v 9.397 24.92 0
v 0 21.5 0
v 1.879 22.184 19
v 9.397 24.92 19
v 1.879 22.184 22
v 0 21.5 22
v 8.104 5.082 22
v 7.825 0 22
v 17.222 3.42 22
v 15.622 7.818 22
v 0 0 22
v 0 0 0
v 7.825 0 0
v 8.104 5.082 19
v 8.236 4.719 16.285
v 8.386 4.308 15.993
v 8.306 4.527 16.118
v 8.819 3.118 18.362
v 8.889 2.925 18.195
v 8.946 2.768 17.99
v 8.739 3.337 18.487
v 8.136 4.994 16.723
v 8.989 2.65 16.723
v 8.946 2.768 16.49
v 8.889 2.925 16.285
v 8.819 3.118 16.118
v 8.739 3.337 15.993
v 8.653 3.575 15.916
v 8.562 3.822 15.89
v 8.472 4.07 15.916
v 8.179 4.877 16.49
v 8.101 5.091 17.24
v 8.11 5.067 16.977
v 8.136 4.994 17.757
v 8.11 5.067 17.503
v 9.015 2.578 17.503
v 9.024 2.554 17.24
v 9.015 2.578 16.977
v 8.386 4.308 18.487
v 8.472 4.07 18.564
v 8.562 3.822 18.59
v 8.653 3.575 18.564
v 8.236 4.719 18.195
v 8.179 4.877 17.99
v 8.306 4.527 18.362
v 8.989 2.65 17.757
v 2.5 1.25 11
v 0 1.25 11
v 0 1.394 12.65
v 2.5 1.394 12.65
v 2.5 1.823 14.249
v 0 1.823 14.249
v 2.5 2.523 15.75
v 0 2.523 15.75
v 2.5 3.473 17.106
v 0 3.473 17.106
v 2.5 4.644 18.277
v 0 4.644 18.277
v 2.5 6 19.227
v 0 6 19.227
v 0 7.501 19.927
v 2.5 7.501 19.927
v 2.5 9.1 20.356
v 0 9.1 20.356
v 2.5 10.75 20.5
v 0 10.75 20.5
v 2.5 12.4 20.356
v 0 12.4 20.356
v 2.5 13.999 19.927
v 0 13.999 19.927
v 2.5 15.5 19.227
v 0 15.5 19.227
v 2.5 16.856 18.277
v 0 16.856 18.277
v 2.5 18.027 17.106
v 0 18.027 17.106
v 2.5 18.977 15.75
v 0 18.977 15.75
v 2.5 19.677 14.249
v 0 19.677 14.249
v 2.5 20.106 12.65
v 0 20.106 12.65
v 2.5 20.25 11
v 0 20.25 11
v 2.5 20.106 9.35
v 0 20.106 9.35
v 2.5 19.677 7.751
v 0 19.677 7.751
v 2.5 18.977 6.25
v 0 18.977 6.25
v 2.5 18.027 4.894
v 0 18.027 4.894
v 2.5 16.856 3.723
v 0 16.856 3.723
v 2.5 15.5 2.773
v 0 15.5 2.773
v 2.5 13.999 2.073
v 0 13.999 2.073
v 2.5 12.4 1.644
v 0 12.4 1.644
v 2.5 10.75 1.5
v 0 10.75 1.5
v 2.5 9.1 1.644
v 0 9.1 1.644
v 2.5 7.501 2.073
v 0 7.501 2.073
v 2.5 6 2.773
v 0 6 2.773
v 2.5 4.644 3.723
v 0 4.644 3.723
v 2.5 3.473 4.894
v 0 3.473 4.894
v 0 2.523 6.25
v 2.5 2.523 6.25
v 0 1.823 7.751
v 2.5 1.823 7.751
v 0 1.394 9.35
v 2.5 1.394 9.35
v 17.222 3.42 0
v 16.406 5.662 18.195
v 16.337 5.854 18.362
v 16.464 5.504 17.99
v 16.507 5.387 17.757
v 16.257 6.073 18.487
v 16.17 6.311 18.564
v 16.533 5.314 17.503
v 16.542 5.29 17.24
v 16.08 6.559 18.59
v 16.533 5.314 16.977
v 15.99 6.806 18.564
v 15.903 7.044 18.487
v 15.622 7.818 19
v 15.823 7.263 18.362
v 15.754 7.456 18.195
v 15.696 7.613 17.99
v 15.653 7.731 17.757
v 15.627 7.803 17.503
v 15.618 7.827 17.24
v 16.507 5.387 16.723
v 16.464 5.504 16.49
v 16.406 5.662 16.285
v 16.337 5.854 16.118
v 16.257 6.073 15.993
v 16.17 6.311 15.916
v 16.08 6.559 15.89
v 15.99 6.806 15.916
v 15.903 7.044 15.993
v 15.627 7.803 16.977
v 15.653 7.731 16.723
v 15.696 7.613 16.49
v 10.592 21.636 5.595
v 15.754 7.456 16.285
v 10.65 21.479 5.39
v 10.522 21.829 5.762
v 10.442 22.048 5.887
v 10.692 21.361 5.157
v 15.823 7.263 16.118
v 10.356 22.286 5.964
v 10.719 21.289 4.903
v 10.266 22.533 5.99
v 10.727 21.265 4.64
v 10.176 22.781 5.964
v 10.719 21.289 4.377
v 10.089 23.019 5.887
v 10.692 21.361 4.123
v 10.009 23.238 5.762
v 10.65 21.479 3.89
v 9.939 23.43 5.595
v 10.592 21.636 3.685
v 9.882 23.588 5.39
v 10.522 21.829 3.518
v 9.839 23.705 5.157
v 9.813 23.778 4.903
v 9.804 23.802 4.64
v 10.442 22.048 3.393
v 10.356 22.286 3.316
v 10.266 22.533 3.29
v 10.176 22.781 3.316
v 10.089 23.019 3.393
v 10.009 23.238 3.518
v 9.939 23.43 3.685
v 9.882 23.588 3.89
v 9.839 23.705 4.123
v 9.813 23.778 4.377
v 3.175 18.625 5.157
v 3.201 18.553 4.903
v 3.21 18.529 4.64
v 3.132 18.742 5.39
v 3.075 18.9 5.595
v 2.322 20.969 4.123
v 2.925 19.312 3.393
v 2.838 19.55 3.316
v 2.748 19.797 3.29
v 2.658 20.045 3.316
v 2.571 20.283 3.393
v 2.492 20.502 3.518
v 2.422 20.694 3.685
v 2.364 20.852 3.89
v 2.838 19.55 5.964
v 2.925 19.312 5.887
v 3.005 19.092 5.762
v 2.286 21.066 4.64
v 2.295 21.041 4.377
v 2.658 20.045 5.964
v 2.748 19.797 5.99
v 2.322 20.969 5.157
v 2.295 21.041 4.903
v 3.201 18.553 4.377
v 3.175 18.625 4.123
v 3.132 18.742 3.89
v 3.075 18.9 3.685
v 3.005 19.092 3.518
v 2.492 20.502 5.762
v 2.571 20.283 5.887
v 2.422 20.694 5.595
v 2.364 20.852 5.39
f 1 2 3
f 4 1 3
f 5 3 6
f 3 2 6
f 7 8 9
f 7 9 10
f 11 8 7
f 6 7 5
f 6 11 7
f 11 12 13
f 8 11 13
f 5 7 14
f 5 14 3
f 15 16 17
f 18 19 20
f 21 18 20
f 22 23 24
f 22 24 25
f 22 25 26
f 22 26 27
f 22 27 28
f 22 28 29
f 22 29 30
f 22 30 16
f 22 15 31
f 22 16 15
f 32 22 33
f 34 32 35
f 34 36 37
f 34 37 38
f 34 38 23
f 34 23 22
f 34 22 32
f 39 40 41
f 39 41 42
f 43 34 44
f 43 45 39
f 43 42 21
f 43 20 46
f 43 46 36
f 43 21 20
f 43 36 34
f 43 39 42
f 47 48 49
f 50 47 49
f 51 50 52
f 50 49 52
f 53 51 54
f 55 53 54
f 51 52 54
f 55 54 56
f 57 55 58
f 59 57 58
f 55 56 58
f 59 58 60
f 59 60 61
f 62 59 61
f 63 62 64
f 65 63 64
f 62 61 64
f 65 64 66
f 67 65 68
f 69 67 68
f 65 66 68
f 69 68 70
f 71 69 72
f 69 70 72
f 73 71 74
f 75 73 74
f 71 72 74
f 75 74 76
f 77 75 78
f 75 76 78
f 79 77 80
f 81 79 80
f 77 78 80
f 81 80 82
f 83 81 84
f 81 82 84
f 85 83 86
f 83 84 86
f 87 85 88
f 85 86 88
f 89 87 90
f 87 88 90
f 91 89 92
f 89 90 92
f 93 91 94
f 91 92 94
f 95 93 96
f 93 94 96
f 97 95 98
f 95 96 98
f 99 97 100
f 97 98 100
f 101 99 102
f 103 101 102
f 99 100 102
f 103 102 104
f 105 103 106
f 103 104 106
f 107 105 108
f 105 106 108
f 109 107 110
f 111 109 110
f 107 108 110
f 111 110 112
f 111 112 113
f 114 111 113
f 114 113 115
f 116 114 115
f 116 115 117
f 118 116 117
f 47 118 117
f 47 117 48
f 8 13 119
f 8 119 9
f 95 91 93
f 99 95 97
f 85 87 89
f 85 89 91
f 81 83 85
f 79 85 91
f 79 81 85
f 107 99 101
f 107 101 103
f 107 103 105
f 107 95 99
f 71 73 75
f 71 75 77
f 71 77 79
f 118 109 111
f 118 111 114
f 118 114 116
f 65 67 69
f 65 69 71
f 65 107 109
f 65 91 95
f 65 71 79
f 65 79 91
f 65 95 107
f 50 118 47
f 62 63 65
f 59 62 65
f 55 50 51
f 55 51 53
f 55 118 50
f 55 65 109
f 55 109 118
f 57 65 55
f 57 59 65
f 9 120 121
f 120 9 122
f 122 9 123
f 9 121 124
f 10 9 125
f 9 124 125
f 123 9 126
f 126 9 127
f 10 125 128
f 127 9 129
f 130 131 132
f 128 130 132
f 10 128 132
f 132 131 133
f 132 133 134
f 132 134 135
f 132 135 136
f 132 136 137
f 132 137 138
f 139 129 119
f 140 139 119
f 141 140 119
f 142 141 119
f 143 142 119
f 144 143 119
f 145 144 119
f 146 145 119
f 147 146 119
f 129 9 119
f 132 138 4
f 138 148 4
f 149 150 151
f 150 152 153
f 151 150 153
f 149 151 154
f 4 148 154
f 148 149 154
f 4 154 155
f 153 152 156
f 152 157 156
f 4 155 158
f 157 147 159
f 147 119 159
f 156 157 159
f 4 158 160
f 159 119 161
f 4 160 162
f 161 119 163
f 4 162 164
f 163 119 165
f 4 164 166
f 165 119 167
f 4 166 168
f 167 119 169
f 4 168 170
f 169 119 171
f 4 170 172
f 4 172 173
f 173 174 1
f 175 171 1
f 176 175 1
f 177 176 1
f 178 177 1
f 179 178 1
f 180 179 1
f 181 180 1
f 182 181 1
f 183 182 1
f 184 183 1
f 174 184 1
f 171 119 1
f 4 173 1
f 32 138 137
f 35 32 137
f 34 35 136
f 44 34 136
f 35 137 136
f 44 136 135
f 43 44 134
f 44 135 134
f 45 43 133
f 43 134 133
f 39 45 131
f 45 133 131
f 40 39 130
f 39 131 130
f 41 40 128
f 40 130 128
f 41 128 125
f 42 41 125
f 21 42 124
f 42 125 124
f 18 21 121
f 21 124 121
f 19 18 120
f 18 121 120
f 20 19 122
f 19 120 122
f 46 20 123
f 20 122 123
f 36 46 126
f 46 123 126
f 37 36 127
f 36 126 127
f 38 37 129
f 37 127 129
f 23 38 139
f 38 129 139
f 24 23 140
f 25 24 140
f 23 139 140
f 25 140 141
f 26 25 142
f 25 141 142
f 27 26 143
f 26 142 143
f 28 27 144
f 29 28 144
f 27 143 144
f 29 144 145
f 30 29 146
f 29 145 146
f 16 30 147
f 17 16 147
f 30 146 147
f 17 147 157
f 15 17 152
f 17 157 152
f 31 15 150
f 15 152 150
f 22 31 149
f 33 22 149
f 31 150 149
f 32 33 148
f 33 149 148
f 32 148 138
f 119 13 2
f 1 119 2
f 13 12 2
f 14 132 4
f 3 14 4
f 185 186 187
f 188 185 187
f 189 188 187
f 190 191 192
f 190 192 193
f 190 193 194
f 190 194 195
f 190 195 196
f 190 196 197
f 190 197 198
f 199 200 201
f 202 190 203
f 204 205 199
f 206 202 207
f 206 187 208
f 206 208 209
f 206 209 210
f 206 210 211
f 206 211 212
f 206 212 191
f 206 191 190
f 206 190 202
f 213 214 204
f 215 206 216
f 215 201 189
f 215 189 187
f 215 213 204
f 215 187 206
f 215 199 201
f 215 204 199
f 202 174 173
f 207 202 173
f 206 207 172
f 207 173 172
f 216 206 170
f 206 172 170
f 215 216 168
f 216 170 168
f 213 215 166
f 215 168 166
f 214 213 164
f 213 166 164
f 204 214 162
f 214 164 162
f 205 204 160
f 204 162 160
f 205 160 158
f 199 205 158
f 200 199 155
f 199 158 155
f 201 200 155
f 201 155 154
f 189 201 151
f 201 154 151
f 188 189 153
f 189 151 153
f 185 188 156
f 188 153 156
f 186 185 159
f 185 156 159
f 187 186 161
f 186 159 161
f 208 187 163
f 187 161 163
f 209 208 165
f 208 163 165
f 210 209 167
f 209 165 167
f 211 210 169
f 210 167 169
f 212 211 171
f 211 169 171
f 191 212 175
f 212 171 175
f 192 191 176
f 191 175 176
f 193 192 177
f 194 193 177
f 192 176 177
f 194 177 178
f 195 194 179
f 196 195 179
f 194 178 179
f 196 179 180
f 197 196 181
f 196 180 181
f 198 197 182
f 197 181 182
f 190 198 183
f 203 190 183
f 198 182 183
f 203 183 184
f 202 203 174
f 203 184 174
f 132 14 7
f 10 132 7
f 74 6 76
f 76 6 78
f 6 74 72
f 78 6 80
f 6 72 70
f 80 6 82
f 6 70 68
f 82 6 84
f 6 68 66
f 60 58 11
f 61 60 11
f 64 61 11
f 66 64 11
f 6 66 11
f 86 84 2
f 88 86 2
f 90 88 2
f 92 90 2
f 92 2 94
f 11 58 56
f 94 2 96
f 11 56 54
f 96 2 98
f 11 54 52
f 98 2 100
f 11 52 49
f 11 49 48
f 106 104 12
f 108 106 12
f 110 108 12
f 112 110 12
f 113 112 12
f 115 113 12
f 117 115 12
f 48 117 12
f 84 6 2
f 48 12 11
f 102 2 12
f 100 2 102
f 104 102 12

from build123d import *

# Parameters (mm, degrees)
F1_DEPTH = 22
F2_DEPTH = 10
F3_R     = 9.5
F4_DEPTH = 2.5
F5_R     = 1.35
F5_W     = 18.2
F5_H     = 3
F6_DEPTH = 8


with BuildPart() as f1:
    # F0 (on Top) → F1 (new body)
    with BuildSketch(Plane.XY):
        Polygon((0, 21.5), (0, 0), (7.8253600367, 0), align=None)
    extrude(amount=F1_DEPTH)

    # F2 (add): a face of the model
    f2_faces = [f1.faces().sort_by_distance(p)[0] for p in [
        (3.9126800184, 10.75, 11),
    ]]
    extrude(f2_faces, amount=F2_DEPTH)

    # F3 (on face) → F4 (cut)
    with BuildSketch(Plane(origin=(0, 0, 0), x_dir=(0, -1, 0), z_dir=(-1, 0, 0))):
        with Locations((-10.75, 11)):
            Circle(F3_R)
    extrude(amount=-F4_DEPTH, mode=Mode.SUBTRACT)

    # F5 (on face) → F6 (cut)
    with BuildSketch(Plane(origin=(16.306893012, 5.9352236697, 0), x_dir=(-0.3420201433, 0.9396926208, 0), z_dir=(0.9396926208, 0.3420201433, 0))):
        with Locations((0.6633913469, 17.24)):
            Circle(F5_R)
        with Locations((17.6633913469, 4.64)):
            Circle(F5_R)
        with Locations((11.1033913469, 20.5)):
            Rectangle(F5_W, F5_H)
    extrude(amount=-F6_DEPTH, mode=Mode.SUBTRACT)


solid = f1.part
